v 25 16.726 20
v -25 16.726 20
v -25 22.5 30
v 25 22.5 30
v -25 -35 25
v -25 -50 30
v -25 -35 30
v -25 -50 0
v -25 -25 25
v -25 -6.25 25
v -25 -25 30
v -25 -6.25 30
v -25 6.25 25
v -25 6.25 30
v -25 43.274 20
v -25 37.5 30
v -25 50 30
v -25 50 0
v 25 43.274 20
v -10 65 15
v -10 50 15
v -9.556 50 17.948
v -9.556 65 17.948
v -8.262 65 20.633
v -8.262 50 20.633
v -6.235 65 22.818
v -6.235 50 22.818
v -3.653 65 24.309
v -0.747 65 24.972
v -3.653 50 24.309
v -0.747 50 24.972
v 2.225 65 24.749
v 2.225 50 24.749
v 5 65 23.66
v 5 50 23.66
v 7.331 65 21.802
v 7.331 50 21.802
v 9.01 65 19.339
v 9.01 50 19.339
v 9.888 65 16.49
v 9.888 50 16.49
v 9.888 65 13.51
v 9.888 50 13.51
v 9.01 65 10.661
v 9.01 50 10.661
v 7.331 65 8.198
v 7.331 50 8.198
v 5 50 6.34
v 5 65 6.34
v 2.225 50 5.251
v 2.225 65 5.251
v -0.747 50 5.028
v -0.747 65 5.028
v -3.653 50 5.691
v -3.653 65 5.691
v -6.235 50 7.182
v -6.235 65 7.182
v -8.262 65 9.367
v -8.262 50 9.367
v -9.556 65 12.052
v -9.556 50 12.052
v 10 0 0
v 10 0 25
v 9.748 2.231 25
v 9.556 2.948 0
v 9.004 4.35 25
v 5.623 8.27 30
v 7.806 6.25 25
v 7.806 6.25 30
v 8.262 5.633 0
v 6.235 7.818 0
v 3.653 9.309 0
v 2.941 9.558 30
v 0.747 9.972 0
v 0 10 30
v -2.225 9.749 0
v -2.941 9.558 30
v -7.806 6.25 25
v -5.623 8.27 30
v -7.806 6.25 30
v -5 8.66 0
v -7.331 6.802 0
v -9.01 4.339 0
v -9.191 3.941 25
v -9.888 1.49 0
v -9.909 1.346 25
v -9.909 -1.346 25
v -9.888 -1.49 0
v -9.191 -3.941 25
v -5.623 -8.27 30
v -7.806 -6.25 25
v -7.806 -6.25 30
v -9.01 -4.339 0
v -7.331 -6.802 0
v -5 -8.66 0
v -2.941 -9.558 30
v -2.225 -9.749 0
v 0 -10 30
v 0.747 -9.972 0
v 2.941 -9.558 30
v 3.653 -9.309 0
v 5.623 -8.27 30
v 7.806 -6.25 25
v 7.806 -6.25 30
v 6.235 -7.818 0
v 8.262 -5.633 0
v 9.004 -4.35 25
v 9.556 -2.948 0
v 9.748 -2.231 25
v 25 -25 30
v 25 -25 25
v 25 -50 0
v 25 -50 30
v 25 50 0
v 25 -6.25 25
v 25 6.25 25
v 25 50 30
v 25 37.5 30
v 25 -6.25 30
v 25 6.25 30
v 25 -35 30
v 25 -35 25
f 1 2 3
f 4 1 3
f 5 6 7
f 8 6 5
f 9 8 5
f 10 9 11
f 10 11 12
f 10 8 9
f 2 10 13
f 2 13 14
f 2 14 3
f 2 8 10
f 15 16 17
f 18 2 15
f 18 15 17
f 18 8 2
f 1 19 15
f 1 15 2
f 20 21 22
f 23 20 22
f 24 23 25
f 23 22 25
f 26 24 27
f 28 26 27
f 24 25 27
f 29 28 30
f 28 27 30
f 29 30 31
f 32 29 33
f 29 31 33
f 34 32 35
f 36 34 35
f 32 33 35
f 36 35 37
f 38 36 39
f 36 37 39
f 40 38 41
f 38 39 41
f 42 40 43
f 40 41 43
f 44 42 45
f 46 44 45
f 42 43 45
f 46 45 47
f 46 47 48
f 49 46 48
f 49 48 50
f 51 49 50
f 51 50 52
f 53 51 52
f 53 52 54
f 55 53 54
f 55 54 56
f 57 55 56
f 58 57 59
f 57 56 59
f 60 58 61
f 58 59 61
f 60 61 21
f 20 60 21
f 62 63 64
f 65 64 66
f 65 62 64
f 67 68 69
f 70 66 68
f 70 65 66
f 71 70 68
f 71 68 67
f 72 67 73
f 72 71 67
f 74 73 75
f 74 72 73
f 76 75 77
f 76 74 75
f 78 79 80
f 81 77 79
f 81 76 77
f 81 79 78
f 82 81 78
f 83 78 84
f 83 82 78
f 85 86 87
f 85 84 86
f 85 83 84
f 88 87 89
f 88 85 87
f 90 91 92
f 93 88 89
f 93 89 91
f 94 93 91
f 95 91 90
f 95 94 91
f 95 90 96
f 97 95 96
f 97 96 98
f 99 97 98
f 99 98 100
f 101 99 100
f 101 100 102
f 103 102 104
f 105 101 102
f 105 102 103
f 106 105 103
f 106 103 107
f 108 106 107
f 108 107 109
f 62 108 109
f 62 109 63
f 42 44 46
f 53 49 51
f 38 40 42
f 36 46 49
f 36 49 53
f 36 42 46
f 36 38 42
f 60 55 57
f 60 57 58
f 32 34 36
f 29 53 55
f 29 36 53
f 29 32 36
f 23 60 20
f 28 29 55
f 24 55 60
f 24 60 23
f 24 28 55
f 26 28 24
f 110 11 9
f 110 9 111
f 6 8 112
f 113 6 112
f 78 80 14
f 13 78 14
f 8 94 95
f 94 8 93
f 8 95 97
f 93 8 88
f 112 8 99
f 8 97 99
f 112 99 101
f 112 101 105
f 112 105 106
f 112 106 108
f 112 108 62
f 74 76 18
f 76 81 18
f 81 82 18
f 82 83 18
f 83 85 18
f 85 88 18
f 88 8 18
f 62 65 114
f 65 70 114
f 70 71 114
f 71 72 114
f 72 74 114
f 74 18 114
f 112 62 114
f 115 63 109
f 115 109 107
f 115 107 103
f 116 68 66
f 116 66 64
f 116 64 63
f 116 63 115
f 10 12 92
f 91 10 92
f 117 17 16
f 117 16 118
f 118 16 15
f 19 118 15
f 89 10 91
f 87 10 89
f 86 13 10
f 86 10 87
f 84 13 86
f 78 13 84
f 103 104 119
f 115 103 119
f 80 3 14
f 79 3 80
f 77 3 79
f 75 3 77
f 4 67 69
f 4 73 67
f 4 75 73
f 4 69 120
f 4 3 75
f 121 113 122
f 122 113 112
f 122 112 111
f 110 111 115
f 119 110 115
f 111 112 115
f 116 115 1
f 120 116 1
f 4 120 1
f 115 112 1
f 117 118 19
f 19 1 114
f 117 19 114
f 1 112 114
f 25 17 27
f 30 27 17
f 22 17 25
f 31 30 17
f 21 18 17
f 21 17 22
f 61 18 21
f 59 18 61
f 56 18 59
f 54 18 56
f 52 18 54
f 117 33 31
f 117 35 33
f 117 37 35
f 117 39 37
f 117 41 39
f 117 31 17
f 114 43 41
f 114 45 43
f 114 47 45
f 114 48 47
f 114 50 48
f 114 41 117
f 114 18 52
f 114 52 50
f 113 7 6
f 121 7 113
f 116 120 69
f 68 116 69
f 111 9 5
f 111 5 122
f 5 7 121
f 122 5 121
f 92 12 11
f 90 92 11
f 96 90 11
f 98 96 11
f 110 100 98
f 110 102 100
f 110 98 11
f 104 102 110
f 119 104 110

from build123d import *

# Parameters (mm, degrees)
F0_W     = 50
F0_H     = 100
F0_R     = 10
F1_DEPTH = 30
F2_W     = 50
F2_H     = 10
F3_DEPTH = 5
F5_DEPTH = 50
F6_R     = 10
F7_DEPTH = 15


with BuildPart() as f1:
    # F0 (on Top) → F1 (new body)
    with BuildSketch(Plane.XY):
        Rectangle(F0_W, F0_H)
        Circle(F0_R, mode=Mode.SUBTRACT)
    extrude(amount=F1_DEPTH)

    # F2 (on face) → F3 (cut)
    with BuildSketch(Plane.XY.offset(30)):
        with BuildLine():
            Line((7.806247498, -6.25), (25, -6.25))
            Line((25, -6.25), (25, 6.25))
            Line((25, 6.25), (7.806247498, 6.25))
            ThreePointArc((7.806247498, 6.25), (9.4356365705, 3.3119122135), (10, 0))
            ThreePointArc((10, 0), (9.4356365705, -3.3119122135), (7.806247498, -6.25))
        make_face()
        with Locations((0, -30)):
            Rectangle(F2_W, F2_H)
        with BuildLine():
            Line((-25, 6.25), (-25, -6.25))
            Line((-25, -6.25), (-7.806247498, -6.25))
            ThreePointArc((-7.806247498, -6.25), (-10, 0), (-7.806247498, 6.25))
            Line((-7.806247498, 6.25), (-25, 6.25))
        make_face()
    extrude(amount=-F3_DEPTH, mode=Mode.SUBTRACT)

    # F4 (on face) → F5 (cut, through all)
    with BuildSketch(Plane(origin=(-25, 0, 0), x_dir=(0, -1, 0), z_dir=(-1, 0, 0))):
        Polygon((-22.5, 30), (-37.5, 30), (-43.2735026919, 20), (-16.7264973081, 20), align=None)
    extrude(amount=-F5_DEPTH, mode=Mode.SUBTRACT)

    # F6 (on face) → F7 (join)
    with BuildSketch(Plane(origin=(0, 50, 0), x_dir=(-1, 0, 0), z_dir=(0, 1, 0))):
        with Locations((0, 15)):
            Circle(F6_R)
    extrude(amount=F7_DEPTH)


solid = f1.part
